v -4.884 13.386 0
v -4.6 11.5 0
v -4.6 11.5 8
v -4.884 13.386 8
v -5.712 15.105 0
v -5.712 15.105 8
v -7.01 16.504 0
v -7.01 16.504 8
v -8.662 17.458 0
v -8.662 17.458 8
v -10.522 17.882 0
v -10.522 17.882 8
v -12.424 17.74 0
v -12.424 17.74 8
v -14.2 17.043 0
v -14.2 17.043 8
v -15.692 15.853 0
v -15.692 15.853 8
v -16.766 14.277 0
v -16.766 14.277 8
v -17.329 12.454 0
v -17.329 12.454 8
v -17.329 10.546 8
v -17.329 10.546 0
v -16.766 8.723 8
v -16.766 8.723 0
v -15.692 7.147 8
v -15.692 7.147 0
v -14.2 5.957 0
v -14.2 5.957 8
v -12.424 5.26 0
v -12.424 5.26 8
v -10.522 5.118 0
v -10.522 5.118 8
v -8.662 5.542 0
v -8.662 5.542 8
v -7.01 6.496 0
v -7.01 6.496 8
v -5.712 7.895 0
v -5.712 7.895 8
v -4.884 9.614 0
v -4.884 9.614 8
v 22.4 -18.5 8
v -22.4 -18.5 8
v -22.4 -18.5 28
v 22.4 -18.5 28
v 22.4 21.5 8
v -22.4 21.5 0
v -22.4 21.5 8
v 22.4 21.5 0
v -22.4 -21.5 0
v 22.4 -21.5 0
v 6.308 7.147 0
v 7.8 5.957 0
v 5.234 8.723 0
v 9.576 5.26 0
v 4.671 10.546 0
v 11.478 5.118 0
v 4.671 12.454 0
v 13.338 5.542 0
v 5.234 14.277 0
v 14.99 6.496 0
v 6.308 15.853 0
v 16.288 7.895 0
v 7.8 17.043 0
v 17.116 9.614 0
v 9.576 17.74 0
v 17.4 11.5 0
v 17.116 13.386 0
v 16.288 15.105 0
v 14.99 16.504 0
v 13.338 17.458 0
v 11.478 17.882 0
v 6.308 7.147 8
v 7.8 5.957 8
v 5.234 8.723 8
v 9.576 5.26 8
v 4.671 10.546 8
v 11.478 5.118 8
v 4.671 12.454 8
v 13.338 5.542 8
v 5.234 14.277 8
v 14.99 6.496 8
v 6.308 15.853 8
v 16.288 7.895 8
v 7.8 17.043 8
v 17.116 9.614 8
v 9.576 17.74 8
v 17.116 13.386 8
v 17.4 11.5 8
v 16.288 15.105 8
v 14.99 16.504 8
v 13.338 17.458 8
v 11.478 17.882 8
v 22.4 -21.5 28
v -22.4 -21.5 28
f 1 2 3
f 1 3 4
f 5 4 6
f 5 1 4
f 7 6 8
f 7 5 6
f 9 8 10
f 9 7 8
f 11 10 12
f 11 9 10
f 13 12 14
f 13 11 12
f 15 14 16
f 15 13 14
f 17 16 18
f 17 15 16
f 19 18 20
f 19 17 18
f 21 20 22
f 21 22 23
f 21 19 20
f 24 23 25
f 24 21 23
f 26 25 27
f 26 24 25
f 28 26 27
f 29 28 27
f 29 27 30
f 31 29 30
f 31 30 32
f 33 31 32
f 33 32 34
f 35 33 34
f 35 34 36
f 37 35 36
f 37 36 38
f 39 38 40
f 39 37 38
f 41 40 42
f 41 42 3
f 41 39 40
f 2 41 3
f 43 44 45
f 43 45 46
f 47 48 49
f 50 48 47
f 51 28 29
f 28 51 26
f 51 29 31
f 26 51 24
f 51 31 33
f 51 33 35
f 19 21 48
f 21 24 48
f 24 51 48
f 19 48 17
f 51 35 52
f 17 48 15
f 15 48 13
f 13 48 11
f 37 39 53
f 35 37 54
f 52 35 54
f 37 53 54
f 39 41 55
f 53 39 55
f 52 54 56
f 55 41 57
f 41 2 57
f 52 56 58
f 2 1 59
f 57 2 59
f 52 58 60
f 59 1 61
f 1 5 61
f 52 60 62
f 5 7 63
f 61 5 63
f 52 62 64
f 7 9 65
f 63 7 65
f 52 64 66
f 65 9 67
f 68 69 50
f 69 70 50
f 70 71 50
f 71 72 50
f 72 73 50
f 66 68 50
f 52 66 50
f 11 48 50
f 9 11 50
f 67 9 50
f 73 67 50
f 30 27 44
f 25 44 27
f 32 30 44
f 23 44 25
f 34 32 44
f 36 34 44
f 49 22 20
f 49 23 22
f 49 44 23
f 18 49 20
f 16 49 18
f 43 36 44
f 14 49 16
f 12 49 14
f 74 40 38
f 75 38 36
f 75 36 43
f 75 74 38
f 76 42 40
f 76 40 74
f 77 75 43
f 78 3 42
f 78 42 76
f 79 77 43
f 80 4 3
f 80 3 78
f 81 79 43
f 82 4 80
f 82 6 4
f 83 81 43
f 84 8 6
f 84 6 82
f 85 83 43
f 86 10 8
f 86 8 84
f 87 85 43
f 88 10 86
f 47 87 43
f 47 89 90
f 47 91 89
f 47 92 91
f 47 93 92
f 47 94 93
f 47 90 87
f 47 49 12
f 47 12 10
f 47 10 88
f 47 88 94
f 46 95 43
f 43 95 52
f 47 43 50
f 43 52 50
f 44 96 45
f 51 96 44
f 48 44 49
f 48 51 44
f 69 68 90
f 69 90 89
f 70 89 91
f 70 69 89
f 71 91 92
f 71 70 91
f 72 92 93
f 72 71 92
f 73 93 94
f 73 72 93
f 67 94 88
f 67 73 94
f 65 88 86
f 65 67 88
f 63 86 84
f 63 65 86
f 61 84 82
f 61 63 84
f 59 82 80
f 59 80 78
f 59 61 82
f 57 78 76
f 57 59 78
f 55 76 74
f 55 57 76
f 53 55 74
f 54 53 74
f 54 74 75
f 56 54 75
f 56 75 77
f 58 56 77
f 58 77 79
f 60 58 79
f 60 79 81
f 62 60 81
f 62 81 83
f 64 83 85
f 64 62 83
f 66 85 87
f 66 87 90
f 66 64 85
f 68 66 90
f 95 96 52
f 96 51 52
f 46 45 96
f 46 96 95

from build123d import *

# Parameters (mm, degrees)
CROQUIS7_W              = 44.8
CROQUIS7_H              = 43
CROQUIS7_R              = 6.4
SALIENTE_EXTRUIR4_DEPTH = 8
CROQUIS8_W              = 44.8
CROQUIS8_H              = 3
SALIENTE_EXTRUIR5_DEPTH = 20


with BuildPart() as part:
    # Croquis7 → Saliente-Extruir4 (new body)
    with BuildSketch(Plane.XY):
        Rectangle(CROQUIS7_W, CROQUIS7_H)
        with Locations((-11, 11.5)):
            Circle(CROQUIS7_R, mode=Mode.SUBTRACT)
        with Locations((11, 11.5)):
            Circle(CROQUIS7_R, mode=Mode.SUBTRACT)
    extrude(amount=SALIENTE_EXTRUIR4_DEPTH)

    # Croquis8 → Saliente-Extruir5 (add)
    with BuildSketch(Plane.XY.offset(8)):
        with Locations((0, -20)):
            Rectangle(CROQUIS8_W, CROQUIS8_H)
    extrude(amount=SALIENTE_EXTRUIR5_DEPTH)


solid = part.part
